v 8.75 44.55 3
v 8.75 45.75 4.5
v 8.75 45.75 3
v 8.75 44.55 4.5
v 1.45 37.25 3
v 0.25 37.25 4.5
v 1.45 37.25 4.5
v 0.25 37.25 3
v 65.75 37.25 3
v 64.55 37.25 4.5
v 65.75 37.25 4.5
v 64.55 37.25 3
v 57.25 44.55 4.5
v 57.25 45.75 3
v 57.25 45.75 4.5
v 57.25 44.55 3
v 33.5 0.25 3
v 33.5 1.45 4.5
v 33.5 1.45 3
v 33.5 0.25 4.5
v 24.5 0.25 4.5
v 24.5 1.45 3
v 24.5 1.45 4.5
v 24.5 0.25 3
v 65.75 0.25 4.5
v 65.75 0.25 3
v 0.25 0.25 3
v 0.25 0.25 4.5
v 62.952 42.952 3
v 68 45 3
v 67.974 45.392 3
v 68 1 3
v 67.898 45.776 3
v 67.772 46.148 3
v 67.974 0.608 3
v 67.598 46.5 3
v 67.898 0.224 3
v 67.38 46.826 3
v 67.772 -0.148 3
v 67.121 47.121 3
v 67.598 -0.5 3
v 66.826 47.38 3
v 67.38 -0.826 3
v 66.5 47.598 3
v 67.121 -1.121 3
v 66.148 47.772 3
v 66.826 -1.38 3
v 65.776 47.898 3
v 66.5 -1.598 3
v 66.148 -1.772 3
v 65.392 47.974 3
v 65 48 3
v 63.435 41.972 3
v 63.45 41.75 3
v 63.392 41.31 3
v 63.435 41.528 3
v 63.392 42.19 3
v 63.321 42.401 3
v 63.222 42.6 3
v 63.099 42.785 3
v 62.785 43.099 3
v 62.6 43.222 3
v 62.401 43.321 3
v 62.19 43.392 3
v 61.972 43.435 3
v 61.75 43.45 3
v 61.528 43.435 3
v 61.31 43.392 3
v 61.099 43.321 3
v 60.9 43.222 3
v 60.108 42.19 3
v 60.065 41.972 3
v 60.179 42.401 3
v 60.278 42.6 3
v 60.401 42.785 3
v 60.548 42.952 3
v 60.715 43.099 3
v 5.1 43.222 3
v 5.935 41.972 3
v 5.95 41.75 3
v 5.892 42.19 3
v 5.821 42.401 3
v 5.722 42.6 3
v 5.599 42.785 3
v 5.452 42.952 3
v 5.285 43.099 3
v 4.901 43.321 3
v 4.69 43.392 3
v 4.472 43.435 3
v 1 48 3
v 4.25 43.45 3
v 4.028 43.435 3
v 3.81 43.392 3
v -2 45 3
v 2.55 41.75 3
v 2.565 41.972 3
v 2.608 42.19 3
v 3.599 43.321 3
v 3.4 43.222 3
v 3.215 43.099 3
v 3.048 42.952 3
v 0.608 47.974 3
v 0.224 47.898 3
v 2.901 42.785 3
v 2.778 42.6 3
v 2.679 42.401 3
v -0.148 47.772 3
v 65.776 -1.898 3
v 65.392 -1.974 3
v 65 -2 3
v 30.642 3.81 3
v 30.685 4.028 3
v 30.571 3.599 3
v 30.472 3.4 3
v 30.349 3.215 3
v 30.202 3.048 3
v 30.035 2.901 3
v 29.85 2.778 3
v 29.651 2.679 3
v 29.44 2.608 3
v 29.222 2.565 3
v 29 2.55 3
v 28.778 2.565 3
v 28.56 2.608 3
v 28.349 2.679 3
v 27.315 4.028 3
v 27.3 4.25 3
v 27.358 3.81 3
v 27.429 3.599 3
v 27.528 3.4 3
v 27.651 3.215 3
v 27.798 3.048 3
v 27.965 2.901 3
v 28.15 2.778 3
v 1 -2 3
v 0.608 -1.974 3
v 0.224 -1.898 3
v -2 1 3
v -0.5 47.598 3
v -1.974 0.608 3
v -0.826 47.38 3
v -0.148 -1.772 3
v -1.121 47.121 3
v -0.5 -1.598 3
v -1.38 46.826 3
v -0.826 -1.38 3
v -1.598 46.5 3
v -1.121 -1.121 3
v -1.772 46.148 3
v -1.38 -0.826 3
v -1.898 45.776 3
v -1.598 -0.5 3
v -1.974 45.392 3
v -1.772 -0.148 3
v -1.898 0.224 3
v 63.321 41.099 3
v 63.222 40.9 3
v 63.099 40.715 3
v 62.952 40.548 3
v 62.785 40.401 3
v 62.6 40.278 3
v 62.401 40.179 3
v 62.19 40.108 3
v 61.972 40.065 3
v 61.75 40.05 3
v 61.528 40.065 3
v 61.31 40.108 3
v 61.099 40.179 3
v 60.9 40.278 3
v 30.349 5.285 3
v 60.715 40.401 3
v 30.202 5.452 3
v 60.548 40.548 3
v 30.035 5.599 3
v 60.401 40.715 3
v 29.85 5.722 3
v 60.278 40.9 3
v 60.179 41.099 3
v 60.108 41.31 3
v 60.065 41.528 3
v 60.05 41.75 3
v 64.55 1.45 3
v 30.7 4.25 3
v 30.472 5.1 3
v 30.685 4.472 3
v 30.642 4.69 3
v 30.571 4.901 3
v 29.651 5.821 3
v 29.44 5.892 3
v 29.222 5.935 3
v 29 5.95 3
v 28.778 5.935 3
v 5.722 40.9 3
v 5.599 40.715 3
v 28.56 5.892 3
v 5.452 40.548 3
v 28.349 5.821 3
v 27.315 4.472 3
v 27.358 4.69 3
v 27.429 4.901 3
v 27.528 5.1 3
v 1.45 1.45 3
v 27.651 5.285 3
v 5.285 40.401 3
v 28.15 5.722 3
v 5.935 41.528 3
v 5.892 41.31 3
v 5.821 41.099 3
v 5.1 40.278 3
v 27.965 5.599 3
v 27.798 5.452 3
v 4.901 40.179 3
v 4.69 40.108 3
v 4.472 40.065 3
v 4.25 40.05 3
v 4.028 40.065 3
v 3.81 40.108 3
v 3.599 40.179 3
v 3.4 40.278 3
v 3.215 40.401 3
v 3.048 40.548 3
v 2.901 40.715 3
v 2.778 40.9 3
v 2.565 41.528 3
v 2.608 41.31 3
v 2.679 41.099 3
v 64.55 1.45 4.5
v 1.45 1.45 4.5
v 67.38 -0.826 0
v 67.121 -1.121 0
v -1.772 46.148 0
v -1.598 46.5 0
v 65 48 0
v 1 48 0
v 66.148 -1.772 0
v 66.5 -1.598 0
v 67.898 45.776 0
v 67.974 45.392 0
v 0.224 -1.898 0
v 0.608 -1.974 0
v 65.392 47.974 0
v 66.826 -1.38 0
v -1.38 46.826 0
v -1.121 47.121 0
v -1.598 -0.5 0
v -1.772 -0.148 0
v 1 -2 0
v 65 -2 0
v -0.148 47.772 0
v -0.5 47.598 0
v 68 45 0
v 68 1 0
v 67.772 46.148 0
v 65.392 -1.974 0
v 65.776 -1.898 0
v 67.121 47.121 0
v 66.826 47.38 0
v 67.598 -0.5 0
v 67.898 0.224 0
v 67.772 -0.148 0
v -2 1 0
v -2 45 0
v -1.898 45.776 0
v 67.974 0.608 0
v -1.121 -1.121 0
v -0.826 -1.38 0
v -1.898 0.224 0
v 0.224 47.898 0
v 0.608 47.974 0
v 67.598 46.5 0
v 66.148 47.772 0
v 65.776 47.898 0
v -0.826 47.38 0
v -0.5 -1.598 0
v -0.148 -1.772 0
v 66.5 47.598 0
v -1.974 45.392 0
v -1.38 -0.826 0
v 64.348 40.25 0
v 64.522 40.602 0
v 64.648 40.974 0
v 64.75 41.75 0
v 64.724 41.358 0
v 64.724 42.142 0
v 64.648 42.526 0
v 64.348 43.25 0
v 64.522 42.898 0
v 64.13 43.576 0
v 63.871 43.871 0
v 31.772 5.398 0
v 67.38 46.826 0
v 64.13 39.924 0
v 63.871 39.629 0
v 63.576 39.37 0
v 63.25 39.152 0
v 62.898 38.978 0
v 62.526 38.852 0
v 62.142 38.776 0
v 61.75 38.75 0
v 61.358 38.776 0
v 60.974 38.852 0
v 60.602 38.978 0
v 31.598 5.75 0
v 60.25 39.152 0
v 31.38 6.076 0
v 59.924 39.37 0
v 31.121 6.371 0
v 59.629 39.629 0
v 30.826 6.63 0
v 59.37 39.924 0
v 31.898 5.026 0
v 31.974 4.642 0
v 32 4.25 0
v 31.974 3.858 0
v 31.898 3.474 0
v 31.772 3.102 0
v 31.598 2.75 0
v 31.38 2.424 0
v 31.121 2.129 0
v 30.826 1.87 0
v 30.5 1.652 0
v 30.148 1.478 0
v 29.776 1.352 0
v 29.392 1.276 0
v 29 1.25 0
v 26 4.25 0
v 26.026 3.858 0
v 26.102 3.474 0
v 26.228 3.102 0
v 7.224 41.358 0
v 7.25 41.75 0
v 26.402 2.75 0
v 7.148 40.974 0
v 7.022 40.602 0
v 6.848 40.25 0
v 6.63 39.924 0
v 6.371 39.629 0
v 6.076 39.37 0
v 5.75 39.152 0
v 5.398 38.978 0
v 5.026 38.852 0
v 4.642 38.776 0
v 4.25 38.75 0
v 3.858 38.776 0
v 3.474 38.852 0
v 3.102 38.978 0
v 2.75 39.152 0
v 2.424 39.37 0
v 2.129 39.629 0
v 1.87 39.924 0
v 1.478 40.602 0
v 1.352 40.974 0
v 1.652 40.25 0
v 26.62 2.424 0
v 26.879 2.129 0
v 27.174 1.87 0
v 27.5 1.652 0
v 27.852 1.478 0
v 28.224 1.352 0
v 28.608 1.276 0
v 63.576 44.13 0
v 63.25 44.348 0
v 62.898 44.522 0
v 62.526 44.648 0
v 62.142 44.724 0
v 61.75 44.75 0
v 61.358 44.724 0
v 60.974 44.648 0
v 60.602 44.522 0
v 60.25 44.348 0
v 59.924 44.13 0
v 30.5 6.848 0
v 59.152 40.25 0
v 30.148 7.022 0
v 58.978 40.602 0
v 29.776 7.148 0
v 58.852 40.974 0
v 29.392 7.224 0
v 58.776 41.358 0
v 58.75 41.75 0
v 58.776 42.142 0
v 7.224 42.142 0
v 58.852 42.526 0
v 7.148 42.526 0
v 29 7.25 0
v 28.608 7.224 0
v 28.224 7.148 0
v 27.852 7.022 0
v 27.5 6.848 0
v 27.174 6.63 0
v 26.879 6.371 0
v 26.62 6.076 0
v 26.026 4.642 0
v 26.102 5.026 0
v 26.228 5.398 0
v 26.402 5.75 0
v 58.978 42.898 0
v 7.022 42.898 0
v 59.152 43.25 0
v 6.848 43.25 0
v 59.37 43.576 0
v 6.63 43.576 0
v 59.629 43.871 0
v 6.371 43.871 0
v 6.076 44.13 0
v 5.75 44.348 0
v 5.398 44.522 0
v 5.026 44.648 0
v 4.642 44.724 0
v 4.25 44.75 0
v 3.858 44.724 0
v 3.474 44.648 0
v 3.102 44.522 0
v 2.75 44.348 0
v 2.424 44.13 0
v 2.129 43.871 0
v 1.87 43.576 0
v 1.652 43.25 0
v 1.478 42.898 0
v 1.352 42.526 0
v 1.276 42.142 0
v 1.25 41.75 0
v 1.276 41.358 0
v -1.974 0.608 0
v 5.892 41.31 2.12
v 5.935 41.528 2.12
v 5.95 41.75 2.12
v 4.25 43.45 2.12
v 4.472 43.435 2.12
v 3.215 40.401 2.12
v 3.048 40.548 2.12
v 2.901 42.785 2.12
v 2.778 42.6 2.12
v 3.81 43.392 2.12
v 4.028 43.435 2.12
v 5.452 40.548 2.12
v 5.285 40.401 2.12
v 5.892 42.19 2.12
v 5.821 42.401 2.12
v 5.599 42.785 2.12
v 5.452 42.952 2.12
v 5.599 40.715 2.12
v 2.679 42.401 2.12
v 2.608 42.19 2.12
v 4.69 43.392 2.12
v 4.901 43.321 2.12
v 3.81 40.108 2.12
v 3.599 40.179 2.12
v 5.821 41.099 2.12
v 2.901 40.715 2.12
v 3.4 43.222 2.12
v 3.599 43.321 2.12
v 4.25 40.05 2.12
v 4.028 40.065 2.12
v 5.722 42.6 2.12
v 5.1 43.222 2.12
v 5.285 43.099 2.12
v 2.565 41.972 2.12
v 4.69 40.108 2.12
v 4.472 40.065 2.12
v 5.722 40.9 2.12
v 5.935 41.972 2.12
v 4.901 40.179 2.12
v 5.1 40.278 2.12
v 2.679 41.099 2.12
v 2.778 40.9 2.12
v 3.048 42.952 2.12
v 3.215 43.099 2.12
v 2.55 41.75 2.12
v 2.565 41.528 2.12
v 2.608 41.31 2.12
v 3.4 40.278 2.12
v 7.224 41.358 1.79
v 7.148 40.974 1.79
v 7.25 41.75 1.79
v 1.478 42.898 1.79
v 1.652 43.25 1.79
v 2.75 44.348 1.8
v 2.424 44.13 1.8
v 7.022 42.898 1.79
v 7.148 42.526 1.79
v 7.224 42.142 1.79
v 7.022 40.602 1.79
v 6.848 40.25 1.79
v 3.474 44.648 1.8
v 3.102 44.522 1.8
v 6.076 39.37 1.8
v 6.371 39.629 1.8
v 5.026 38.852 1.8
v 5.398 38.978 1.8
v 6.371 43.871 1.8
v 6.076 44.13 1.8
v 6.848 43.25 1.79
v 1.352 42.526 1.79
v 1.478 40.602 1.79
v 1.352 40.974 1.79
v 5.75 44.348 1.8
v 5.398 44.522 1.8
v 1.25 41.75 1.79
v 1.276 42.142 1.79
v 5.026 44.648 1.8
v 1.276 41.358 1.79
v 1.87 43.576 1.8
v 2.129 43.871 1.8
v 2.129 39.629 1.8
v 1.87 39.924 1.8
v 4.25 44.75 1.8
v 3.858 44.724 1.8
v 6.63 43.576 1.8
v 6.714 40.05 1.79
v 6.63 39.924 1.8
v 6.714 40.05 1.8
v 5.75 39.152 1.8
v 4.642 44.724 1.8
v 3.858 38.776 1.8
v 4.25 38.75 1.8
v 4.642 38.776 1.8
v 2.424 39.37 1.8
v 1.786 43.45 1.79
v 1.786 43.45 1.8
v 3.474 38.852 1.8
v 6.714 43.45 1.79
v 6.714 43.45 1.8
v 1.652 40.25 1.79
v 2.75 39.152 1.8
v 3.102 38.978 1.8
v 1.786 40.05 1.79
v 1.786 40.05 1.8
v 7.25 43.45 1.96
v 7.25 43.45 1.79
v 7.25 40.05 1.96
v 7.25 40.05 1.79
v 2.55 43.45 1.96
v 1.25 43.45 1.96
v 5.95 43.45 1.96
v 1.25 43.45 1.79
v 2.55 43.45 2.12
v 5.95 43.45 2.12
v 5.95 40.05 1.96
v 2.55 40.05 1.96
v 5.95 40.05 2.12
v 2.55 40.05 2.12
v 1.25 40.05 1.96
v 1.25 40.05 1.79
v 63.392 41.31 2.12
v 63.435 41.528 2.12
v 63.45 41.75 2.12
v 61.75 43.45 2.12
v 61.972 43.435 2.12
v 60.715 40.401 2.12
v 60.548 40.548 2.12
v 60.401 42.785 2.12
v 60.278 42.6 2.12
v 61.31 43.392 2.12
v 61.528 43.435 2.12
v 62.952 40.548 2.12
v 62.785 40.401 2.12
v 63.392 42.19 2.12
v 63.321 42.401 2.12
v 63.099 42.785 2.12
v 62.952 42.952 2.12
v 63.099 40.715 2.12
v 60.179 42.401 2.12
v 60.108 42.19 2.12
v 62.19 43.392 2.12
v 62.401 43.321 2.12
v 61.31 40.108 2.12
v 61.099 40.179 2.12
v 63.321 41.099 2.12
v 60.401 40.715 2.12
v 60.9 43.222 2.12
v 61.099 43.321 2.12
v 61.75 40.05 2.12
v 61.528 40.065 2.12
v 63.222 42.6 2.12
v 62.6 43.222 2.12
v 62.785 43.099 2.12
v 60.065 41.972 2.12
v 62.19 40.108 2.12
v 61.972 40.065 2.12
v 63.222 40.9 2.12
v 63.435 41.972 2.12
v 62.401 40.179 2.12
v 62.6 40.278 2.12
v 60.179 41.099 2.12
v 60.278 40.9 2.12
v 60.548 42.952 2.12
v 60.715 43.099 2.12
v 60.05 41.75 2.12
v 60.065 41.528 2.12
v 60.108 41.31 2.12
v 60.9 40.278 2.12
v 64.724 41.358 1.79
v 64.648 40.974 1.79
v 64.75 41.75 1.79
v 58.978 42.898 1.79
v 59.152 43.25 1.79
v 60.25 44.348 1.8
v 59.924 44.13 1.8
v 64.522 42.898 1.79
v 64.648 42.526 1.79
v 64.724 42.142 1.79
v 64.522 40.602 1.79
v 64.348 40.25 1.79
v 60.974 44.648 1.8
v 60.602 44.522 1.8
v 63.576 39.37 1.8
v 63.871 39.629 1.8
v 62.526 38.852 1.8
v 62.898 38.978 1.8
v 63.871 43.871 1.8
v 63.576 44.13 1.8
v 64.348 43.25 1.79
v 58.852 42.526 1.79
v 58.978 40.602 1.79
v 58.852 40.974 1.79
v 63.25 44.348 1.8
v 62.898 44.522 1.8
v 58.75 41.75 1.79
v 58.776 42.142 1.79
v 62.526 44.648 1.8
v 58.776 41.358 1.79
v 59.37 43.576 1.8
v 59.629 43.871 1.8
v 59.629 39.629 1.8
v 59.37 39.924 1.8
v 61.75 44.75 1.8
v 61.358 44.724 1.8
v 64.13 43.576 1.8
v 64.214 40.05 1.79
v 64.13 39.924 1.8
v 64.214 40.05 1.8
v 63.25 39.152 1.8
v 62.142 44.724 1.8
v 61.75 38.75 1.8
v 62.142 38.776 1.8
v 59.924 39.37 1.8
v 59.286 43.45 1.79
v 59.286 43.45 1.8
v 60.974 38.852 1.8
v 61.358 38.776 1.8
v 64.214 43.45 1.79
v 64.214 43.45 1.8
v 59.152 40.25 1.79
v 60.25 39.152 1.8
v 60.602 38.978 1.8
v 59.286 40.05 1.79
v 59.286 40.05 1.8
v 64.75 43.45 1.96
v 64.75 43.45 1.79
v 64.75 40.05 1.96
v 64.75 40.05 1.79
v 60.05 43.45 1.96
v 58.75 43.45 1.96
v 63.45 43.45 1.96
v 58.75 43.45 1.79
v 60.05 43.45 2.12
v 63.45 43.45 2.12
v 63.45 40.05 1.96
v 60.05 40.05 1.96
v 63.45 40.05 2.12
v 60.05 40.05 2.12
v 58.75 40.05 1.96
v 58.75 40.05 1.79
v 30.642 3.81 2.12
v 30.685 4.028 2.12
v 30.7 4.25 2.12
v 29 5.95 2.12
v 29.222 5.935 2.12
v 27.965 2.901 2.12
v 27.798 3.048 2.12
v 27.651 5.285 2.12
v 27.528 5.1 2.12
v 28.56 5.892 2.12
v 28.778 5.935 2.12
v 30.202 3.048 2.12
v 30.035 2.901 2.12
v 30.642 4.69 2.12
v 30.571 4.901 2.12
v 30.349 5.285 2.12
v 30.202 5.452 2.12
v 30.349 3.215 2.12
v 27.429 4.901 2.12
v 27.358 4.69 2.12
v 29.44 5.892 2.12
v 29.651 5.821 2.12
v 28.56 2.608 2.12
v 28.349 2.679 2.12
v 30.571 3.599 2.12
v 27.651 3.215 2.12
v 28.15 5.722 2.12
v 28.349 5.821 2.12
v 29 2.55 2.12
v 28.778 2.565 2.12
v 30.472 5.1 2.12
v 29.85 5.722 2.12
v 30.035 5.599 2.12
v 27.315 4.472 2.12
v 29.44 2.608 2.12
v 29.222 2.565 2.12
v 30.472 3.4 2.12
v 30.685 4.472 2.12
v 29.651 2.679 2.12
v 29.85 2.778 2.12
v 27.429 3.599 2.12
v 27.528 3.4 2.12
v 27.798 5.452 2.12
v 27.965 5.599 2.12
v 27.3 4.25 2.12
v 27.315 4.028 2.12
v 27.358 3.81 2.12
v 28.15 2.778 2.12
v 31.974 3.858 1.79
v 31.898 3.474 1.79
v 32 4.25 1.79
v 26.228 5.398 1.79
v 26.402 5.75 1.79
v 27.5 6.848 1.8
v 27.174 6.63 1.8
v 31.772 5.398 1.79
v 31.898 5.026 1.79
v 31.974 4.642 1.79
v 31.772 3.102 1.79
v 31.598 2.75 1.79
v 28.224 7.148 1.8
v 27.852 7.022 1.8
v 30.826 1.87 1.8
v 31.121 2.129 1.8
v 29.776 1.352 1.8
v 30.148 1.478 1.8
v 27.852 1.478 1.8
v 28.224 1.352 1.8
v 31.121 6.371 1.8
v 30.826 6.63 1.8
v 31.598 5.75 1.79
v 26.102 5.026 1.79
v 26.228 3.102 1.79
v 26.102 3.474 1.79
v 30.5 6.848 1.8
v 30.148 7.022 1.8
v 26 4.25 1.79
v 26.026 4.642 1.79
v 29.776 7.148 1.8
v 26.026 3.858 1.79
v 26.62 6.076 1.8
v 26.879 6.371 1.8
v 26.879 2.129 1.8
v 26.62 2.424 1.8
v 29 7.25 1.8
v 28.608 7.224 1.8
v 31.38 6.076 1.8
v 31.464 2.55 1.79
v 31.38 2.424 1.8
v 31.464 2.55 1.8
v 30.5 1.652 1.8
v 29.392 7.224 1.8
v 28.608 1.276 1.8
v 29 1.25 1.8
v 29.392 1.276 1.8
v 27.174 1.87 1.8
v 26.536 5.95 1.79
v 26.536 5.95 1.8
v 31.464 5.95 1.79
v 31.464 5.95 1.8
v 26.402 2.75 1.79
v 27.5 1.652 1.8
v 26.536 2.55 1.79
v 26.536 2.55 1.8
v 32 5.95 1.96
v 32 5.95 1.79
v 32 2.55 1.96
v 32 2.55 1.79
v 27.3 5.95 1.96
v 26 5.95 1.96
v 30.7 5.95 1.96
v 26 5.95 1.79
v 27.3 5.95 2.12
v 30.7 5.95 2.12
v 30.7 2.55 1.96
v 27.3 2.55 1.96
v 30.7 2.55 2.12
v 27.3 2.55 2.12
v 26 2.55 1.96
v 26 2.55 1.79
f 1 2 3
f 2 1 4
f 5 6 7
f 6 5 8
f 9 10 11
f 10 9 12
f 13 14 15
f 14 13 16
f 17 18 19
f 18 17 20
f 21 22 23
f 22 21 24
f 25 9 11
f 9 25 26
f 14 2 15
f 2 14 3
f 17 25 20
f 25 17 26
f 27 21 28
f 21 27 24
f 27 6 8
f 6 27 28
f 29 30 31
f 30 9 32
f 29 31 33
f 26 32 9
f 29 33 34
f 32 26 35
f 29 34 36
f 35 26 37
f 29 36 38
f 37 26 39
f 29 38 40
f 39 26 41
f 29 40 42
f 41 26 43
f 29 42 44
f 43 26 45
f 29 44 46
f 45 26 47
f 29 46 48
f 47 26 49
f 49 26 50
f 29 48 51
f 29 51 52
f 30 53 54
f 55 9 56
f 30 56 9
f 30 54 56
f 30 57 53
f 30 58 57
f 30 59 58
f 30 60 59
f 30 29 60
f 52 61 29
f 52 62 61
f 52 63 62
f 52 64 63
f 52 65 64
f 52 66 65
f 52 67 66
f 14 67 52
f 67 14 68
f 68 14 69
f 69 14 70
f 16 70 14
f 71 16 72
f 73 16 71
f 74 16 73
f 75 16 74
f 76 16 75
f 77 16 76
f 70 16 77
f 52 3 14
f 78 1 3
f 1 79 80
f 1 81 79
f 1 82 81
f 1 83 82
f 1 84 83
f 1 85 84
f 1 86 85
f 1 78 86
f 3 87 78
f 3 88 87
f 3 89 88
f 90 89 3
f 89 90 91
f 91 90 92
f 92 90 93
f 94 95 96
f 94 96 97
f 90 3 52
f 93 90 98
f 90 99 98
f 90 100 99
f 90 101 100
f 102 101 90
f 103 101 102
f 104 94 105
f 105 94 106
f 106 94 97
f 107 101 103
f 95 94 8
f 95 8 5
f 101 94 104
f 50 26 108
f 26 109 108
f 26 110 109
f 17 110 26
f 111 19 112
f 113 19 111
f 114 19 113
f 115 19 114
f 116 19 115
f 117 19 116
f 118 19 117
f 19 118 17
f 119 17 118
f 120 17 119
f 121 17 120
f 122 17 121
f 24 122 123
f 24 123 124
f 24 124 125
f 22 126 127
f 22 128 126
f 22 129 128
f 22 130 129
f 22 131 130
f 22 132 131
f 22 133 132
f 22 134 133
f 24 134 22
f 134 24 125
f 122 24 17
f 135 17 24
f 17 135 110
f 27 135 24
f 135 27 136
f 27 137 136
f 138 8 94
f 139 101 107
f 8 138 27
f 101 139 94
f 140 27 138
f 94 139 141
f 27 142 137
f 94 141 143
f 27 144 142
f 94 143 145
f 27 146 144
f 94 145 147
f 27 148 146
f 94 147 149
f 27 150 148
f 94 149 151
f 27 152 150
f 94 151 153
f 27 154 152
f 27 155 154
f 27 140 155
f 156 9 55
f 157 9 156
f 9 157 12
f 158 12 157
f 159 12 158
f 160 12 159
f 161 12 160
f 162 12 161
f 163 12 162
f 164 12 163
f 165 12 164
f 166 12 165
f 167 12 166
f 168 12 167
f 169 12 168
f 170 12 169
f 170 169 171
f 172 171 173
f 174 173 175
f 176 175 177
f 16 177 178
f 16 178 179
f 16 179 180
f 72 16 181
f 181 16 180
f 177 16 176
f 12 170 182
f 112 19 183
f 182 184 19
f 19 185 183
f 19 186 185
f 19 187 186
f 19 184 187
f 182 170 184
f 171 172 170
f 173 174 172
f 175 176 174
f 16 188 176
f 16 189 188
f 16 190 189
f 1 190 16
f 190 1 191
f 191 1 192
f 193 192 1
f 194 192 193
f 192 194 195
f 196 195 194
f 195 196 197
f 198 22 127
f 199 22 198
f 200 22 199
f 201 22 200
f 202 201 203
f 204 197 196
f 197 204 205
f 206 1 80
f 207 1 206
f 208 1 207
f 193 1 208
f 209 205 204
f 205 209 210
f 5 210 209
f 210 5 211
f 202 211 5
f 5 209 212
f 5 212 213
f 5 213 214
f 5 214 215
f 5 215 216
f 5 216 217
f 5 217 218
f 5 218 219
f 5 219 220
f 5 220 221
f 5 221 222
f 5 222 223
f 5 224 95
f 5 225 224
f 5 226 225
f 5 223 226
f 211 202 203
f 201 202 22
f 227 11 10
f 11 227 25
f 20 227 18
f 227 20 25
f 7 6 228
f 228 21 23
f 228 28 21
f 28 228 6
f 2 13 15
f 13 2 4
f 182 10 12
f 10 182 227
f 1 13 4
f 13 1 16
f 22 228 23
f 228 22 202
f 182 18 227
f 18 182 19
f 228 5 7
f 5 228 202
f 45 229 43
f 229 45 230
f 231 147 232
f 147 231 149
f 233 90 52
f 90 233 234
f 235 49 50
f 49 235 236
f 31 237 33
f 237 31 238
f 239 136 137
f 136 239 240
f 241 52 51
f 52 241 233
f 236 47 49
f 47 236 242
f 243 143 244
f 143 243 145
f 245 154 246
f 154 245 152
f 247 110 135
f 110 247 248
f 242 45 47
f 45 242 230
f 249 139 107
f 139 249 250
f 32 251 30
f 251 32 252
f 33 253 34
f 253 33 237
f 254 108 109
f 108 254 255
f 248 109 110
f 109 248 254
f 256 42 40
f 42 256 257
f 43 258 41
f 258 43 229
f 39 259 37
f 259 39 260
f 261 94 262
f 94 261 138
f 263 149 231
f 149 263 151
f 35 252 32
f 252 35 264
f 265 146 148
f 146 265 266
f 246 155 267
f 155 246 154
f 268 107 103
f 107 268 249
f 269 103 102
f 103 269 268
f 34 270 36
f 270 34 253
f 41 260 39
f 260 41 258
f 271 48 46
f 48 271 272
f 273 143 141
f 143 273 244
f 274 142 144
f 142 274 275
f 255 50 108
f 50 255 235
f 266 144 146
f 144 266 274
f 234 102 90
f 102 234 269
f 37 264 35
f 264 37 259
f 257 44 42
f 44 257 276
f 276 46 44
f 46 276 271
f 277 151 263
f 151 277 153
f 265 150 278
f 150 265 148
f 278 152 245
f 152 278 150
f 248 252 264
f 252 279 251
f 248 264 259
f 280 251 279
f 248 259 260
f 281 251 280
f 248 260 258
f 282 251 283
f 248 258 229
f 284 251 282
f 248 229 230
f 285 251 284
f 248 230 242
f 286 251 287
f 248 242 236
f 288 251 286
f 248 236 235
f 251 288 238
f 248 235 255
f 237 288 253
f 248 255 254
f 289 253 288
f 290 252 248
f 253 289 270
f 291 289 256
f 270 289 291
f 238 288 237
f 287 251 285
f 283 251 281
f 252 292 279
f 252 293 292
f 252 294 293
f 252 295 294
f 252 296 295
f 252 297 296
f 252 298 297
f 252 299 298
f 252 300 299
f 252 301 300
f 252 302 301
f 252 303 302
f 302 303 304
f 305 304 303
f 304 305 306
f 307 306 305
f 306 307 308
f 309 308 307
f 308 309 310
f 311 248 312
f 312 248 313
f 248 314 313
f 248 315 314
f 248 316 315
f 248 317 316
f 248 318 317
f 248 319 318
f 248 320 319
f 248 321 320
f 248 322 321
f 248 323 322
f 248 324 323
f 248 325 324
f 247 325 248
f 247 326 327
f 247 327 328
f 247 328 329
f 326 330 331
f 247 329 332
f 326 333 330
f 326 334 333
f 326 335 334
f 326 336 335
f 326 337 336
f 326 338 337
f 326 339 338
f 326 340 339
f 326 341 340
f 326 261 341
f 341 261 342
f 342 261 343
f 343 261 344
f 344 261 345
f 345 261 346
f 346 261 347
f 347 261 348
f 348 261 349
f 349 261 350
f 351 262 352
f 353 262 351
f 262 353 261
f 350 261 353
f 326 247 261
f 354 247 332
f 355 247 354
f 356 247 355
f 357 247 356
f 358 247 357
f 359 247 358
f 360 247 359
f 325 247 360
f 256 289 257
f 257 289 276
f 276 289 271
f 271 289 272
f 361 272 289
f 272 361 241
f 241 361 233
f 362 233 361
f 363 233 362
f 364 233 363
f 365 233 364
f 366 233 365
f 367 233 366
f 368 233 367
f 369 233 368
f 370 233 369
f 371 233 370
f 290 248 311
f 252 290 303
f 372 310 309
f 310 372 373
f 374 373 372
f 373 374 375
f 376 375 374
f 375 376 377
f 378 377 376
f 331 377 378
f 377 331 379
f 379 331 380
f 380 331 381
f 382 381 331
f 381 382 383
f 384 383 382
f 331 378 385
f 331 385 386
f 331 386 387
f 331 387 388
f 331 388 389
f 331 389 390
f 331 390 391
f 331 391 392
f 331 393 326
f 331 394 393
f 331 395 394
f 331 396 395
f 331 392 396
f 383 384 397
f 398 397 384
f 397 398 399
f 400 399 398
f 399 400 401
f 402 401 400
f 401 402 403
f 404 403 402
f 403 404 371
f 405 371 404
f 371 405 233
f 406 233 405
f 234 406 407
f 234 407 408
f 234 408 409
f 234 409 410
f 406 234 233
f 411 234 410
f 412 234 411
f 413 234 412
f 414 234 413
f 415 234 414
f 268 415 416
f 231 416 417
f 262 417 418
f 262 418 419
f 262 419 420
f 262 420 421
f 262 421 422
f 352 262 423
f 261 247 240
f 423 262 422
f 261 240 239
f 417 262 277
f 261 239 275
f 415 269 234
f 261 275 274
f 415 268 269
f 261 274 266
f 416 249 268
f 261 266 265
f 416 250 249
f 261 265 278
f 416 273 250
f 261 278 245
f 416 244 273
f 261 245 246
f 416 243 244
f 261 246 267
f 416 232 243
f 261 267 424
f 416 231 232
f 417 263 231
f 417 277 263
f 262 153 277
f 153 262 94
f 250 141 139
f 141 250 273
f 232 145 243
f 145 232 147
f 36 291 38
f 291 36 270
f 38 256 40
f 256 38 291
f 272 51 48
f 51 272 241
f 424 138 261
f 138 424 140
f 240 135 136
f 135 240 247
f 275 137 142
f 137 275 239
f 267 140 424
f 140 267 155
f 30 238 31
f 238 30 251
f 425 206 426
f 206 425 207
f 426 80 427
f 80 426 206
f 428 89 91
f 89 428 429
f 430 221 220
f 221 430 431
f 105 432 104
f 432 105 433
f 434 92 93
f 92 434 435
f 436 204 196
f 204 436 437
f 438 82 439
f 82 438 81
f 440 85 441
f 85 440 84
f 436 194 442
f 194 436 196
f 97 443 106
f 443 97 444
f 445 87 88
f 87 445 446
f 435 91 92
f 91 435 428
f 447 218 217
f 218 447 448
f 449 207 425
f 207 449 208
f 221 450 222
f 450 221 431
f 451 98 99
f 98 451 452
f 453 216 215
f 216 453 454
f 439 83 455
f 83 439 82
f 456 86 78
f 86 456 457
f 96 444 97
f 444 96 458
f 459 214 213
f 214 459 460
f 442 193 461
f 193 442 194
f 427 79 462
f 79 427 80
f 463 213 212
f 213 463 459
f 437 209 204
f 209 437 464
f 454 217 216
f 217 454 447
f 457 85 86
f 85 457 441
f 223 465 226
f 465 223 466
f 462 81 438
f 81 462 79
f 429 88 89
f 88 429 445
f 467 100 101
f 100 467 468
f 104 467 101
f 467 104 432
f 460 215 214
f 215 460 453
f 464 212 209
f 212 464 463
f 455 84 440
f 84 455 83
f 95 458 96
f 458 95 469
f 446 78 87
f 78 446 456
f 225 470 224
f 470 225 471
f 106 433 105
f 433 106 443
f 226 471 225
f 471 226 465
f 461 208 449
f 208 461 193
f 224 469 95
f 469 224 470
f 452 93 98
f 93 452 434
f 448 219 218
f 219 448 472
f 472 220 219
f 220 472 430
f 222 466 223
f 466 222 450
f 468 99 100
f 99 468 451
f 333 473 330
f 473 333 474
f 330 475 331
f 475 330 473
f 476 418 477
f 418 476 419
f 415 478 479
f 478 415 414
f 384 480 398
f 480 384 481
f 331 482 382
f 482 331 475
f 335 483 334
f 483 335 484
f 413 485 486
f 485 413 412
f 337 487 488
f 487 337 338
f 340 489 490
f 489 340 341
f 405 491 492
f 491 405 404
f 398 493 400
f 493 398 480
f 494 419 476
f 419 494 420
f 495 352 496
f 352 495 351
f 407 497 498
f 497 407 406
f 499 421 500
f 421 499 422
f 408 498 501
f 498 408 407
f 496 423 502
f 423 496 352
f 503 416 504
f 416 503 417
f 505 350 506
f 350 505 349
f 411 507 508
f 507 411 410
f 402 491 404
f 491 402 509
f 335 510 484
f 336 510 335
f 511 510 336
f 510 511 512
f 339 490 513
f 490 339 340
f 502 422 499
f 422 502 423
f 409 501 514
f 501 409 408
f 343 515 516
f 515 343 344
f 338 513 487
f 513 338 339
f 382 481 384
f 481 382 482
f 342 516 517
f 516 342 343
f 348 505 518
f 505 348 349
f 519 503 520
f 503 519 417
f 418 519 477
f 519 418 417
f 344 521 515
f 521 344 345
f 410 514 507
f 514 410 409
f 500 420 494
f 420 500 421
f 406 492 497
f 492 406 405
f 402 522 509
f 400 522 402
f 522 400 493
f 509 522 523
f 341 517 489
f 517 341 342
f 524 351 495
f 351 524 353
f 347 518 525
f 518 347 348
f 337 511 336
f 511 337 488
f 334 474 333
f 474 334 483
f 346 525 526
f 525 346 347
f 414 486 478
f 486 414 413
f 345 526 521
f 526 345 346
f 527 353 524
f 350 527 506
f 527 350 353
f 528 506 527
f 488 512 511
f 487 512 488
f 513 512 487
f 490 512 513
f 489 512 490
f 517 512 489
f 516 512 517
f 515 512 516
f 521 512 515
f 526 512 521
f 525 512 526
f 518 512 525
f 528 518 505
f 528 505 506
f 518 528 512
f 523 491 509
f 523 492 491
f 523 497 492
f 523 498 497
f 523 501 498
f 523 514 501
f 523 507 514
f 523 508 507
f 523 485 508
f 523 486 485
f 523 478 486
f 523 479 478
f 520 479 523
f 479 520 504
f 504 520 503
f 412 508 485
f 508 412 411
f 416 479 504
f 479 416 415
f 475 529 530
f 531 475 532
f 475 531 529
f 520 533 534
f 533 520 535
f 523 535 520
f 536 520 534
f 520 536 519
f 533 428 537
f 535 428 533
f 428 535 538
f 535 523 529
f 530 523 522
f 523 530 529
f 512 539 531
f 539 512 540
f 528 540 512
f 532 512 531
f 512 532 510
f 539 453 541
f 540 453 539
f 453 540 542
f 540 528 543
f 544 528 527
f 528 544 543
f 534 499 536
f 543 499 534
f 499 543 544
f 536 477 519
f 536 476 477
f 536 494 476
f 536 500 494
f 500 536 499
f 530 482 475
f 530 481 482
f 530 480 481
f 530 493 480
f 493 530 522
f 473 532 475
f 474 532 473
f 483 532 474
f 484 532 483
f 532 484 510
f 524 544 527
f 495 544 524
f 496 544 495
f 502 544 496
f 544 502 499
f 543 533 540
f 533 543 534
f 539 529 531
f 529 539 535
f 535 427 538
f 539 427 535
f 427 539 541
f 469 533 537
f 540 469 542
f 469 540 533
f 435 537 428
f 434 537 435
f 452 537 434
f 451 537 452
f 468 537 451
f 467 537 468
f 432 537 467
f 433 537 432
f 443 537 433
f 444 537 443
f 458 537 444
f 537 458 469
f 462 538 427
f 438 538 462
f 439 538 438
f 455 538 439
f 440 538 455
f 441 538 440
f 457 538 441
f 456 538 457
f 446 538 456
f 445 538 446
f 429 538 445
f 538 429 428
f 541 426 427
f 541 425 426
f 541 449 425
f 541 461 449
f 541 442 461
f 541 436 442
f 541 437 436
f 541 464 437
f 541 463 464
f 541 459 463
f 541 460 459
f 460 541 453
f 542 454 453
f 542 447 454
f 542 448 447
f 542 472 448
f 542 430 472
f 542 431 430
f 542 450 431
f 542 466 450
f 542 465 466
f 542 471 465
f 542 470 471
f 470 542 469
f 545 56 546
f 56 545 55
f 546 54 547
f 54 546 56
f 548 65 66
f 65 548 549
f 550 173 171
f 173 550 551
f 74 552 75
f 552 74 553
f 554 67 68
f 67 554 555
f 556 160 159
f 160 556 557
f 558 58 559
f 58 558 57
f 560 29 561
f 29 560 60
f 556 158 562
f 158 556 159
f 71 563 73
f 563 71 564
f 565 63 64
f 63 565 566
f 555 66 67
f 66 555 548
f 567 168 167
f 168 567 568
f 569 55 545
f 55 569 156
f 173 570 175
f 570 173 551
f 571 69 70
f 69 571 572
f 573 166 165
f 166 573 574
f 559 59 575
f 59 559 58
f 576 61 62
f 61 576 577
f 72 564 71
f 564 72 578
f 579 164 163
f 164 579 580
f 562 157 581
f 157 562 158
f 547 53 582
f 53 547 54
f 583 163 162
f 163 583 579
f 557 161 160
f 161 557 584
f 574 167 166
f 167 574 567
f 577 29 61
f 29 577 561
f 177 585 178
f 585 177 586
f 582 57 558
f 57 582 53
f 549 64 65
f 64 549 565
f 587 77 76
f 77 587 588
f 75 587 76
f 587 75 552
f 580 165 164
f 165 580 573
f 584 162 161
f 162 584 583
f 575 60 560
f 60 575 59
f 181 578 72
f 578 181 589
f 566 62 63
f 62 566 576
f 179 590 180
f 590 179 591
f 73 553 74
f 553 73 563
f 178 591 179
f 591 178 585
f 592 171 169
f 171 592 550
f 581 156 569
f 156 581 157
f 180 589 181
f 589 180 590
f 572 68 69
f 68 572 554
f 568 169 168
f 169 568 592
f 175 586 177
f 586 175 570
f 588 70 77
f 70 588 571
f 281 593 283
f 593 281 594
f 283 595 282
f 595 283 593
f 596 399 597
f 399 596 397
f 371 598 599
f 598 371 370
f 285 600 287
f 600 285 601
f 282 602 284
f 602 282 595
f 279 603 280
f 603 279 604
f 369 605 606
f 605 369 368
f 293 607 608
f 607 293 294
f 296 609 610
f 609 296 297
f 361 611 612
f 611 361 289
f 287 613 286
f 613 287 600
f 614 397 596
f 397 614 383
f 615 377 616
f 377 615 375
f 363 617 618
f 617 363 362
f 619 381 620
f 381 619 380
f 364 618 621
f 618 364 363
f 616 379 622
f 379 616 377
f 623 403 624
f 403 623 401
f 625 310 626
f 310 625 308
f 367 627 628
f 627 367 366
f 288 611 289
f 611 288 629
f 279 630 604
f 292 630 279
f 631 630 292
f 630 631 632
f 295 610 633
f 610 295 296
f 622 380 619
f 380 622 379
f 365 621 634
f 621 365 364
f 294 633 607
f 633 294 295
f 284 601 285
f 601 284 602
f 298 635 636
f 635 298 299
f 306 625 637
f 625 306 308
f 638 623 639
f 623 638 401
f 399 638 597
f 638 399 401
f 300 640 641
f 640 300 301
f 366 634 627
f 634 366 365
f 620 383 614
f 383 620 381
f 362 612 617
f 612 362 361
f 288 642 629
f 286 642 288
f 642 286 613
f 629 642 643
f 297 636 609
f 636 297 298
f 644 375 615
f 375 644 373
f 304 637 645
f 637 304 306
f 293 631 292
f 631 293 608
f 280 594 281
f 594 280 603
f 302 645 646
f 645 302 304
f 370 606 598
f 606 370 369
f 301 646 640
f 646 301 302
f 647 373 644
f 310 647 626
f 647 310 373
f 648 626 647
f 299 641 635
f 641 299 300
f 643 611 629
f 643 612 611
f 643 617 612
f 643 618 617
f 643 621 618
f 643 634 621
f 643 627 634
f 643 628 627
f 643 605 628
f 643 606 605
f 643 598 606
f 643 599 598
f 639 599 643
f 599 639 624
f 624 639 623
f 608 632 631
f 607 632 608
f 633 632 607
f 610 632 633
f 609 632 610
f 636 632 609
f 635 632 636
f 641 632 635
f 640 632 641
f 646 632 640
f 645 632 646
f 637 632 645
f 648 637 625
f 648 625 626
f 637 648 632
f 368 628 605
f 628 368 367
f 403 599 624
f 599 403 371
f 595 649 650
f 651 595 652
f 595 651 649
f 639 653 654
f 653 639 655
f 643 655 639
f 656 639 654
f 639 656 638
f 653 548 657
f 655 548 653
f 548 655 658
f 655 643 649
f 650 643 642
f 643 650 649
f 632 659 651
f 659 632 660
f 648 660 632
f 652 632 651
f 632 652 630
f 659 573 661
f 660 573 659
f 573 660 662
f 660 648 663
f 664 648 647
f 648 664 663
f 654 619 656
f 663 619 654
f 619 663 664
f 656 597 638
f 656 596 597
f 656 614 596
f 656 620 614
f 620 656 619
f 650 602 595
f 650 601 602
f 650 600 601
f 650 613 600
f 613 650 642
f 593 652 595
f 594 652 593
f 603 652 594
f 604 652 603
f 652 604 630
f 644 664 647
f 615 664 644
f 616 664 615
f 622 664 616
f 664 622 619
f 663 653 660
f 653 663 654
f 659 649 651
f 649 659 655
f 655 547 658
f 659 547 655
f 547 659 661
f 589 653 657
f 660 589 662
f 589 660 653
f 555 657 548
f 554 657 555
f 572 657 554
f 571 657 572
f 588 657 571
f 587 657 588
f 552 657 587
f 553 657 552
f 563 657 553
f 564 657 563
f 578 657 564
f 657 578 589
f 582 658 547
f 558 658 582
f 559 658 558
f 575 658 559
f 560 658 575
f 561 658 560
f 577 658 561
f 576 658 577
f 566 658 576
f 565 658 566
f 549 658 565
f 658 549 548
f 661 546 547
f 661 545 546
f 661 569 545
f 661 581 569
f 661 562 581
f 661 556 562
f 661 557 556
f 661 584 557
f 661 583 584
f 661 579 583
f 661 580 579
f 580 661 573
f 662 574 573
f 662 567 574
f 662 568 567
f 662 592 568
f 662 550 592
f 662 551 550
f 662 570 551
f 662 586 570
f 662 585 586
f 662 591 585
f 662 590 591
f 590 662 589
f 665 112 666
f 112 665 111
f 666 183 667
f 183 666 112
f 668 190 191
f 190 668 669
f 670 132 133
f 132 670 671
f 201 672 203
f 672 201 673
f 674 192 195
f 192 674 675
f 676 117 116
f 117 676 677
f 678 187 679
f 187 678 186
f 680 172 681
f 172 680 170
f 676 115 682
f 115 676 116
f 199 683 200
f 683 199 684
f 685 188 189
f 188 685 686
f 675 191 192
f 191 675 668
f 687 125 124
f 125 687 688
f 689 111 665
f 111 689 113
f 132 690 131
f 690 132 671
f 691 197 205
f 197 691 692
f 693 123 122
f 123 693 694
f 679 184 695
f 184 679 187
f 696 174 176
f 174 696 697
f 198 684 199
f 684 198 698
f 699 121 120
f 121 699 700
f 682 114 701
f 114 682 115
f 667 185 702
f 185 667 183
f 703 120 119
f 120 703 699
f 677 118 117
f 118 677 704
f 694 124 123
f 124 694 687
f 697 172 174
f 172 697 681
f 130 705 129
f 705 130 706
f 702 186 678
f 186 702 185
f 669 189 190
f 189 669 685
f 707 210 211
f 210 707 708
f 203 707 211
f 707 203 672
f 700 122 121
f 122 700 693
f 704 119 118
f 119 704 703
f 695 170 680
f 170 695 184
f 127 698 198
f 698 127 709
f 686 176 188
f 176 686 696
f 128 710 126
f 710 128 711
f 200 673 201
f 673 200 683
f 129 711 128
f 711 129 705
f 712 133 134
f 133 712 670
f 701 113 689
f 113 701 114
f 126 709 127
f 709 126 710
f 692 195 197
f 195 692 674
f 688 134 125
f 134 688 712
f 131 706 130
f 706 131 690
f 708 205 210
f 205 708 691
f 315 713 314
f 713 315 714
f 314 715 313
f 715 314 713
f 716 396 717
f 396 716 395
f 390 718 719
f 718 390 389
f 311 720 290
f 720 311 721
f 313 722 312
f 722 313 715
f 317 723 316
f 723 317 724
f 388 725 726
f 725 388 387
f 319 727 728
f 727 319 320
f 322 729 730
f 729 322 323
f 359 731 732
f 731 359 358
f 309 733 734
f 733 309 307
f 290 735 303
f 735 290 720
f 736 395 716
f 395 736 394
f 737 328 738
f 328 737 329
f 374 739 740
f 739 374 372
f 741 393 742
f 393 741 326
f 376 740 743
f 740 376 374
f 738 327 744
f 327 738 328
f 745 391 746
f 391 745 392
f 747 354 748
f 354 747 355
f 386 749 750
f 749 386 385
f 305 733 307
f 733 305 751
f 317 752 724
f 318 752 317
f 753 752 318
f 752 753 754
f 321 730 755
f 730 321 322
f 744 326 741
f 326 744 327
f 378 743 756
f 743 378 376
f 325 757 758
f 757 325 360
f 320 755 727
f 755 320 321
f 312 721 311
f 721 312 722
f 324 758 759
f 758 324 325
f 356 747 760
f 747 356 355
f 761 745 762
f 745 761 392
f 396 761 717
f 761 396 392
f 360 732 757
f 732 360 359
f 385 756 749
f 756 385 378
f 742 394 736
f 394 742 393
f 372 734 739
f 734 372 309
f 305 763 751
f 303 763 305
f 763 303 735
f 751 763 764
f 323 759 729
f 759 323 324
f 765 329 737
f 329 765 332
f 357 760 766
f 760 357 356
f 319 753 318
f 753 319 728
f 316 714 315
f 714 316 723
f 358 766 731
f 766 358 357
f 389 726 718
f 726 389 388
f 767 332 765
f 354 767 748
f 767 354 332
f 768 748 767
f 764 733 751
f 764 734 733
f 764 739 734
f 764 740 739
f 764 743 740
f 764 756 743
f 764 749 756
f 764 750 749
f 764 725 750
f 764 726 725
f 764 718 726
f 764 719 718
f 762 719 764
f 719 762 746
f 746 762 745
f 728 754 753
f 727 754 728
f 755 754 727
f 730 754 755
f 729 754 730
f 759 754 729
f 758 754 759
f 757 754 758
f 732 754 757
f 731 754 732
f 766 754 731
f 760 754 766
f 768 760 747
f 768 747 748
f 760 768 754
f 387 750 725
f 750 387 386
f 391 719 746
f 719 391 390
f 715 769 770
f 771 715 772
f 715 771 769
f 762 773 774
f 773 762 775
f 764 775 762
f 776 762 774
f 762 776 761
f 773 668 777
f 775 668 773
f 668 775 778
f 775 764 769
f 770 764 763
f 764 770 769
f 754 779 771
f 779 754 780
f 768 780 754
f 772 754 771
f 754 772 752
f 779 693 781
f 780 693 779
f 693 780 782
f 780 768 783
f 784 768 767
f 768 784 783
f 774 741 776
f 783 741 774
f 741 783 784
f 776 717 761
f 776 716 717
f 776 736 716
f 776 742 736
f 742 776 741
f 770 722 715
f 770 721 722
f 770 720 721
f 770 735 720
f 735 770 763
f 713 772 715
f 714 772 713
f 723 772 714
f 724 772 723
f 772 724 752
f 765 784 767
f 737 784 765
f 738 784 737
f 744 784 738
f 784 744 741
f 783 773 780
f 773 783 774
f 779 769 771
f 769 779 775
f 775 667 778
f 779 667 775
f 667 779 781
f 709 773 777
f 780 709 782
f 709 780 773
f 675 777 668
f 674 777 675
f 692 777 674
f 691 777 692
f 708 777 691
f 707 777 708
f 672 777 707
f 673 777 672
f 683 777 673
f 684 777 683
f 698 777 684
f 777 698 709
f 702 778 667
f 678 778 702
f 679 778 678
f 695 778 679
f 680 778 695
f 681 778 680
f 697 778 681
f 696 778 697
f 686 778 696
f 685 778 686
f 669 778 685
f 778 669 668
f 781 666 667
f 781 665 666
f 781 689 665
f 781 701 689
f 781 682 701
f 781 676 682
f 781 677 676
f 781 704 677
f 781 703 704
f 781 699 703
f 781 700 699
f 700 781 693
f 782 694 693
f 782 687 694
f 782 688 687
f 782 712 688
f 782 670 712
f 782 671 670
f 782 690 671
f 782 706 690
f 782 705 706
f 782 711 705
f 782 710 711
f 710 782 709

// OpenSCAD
// AirWatch Case v4.3 - 2-Part All-PA6-CF Print (0.16 mm, Zero Supports)
// - XIAO ESP32-S3: flat on floor (VHB on shield), 9.25 mm walls, 22 x 19.25 mm pocket, full U.FL cutout
// - ATGM336H GPS:  flat on floor (VHB on RF shield), 9.25 mm walls, 14 x 18.75 mm pocket, full U.FL cutout
// - GPS Antenna:   6.15 x 20.5 mm exposed roof pocket (6.1 mm tall antenna, nubs grip
//                  at 6.0 mm), left-side ramp notch + bottom U.FL/coax pass-through
// - 0.91" SSD1306 OLED: 3-sided C-frame (12.2 mm inner height, header stop on -X, open +X ribbon side)
// - 12 mm buzzer (7 mm deep ring, 12.5 mm ID) & 9.5 mm WS2812B LED (3.4 mm deep, 10.4 mm ID slotted ring)
// - 6x6 2-pin tact switch near rear top edge (glued, easy rear soldering) + SMA bulkhead
//
// Print orientations (pre-rotated):
//   part = "shell" -> front face down, zero supports (PA6-CF)
//   part = "lid"   -> outside down, zero supports (PA6-CF)
// Preview:
//   part = "assembly"

part = "lid";

// ---------------- general ----------------
wall      = 2.0;    // side / top / bottom walls
front     = 2.0;    // driver-facing front wall
lid_t     = 3.0;    // back lid thickness
fit       = 0.25;   // lid lip & buzzer clearance
corner_r  = 3.0;    // outer edge rounding
layer_h   = 0.16;   // slicer layer height (clean counterbore bridges)
usb_right = true;   // true = XIAO on right / GPS on left (aligns both U.FL cutouts)

// Inner cavity (outer = 70 x 50 x 41 mm)
W = 66;             // width  (left-right)
H = 46;             // height (bottom-top)
D = 36;             // depth  (front to lid)

// ---------------- floor pockets (XIAO & GPS, flat on z = 0 with VHB) ----------------
pocket_h  = 9.25;   // tall walls cup past PCB & header bases
pocket_t  = 1.8;    // pocket wall thickness

// XIAO ESP32-S3 (21 mm PCB / 23 mm w/ USB overhang, 18 mm wide, 5.5 mm PCB height, 21 mm w/ DuPonts)
xiao_l_clr  = 22.0; // inner X length (2 mm USB overhang seats into 2 mm side wall slot)
xiao_w_clr  = 19.25;// inner Y width (+1.25 mm over 18 mm board for splayed jumper wires)
xiao_cut_y  = 8.5;  // full floor-to-top inner-wall cutout at front U.FL corner
usb_open_w  = 14.5; // generous USB-C cable opening width (stays clear of rear pocket wall)
usb_open_z1 = 8.5;  // top of USB-C opening (bottom goes flush to -wall as U-slot)

// ATGM336H GPS (13 x 16 mm board: flat RF shield down on VHB, 5-pin DuPonts up at rear,
// U.FL connector on top at front-inner corner exiting through full wall cutout)
gps_w_clr = 14.0;   // inner X width
gps_l_clr = 18.75;  // inner Y length (extra room along U.FL-to-header axis)
gps_cut_y = 7.5;    // full floor-to-top inner-wall cutout at front-inner U.FL corner

// ---------------- built-in exposed GPS ceramic antenna pocket ----------------
// 20 x 6 x 6.1 mm ceramic antenna; coax exits front-left (+X) notch into bottom pass-through
gant_in_w    = 6.15; // pocket width (bump to 6.3 if you want more pronounced nubs)
gant_in_l    = 20.5; // pocket length
gant_h       = 6.1;  // antenna height/depth
gant_proud   = 0.5;  // ceramic height proud above outer roof (set 0 for totally flush)
gant_grip    = 6.0;  // spacing between opposing friction nubs
gant_shelf_t = 1.4;  // bottom shelf floor thickness
gant_wall    = 1.4;  // trough side/rear wall thickness
gant_pass_w  = 4.5;  // bottom pass-through width (flush to +X wall, clears U.FL)
gant_pass_l  = 6.5;  // bottom pass-through length
gant_notch_w = 2.8;  // coax notch width through left (+X) side of front 45-deg ramp

gant_drop = gant_h - gant_proud - wall;           // 3.6 mm below inner ceiling (5.6 mm deep)
gant_nub  = max(0, (gant_in_w - gant_grip) / 2);  // 0.075 mm per side -> 6.0 mm grip

// ---------------- front & top cutouts ----------------
// 0.91" SSD1306 OLED (38 x 12 mm PCB, 22.4 x 5.6 mm active area)
// Butt header edge (-X) against stop wall; +X ribbon end is completely open
oled_w       = 38.0;
oled_h_clr   = 12.2; // tight 12.2 mm inner height for 12 mm PCB
oled_frame_t = 1.6;
oled_frame_d = 3.5;  // cradles VHB + OLED module
oled_win_w   = 25.0;
oled_win_h   = 7.6;
oled_cx      = W / 2 + 0.4; // aligns active pixels dead-center in W/2 window
oled_cz      = H - 9.2;     // 36.8 mm up -> 29.1 mm clear below frame (8.1 mm over XIAO DuPonts)

// Active buzzer (12 x 9.5 mm) — 12.5 mm ID, deeper 7 mm cradle
buz_d      = 12.0;
buz_clr_d  = buz_d + 2 * fit; // 12.5 mm
buz_ring_h = 7.0;

// WS2812B LED (9.5 mm round board) — 10.4 mm ID, deeper 3.4 mm wire-slotted cradle
led_d      = 9.5;
led_clr_d  = 10.4;
led_ring_h = 3.4;
led_hole   = 4.8;

// Top: 6x6 2-pin tact switch (near rear opening) & SMA bulkhead
btn_body   = 6.2;
btn_pitch  = 5.0;
btn_leg_d  = 1.4;
btn_seat_d = 0.6;
sma_hole   = 6.7;

// Lid: 3x M3 screws into heat-set inserts (Ruthex RX-M3x5.7)
insert_d     = 4.0;
insert_hole  = 7.5;
boss         = 8.5;
boss_len     = 9.0;
screw_clear  = 3.4;
screw_head   = 6.0;
screw_head_h = 1.8;
lip_h        = 1.5;
lip_w        = 1.2;

$fn = 48;

// ---------------- layout (inner coords: origin = front-bottom-left) ----------------
function mx(x) = usb_right ? x : W - x;

xiao_x0    = usb_right ? W - xiao_l_clr : 0;
xiao_wallx = usb_right ? xiao_x0 - pocket_t : xiao_l_clr;
xiao_cy    = xiao_w_clr / 2;

gps_x0     = usb_right ? 0 : W - gps_w_clr;
gps_wallx  = usb_right ? gps_w_clr : W - gps_w_clr - pocket_t;

buz_c   = [mx(22.5), 17.0];             // clears 9.25 mm pocket walls & GPS DuPonts
led_c   = [mx(37.5), 17.0];             // aligned with buzzer, clear of buzzer ring & XIAO DuPonts
gant_x0 = (W - gant_in_w) / 2;          // centered on top
gant_y0 = 8.8;                          // 45-deg front ramp starts at y=3.8 (clears OLED frame)
btn_c   = [mx(16.0), D - 6.5];          // 6.5 mm from open rear edge for easy soldering
sma_c   = [mx(W - 15.0), D - 8.5];      // clears OLED, GPS pocket & top-right boss
screws  = [
  [boss / 2, H - boss / 2],
  [W - boss / 2, H - boss / 2],
  [mx(29.0), boss / 2]                  // centered in 26.4 mm open gap between GPS & XIAO
];

// ---------------- helpers ----------------
module rounded_box(x0, x1, y0, y1, z0, z1, r) {
  hull() for (x = [x0 + r, x1 - r], z = [z0 + r, z1 - r])
    translate([x, y0, z]) rotate([-90, 0, 0]) cylinder(r = r, h = y1 - y0);
}

// Round hole along z with 45-deg teardrop peak at +y (prints clean front-down)
module tear_z(d, h) {
  linear_extrude(h) hull() {
    circle(d = d);
    translate([0, d / 2 * 1.414]) circle(d = 0.01);
  }
}

// Shallow outside-top pocket with 45-deg sloped +y edge (zero overhang)
module sloped_top_pocket(x0, y0, w, l, depth) {
  hull() {
    translate([x0, y0, H + wall - depth]) cube([w, l, 0.01]);
    translate([x0, y0, H + wall]) cube([w, l + depth, 1]);
  }
}

// M3 heat-set boss with 45-deg self-supporting front ramp
module insert_boss(c) {
  x0 = max(0, min(W - boss, c[0] - boss / 2));
  z0 = max(0, min(H - boss, c[1] - boss / 2));
  difference() {
    hull() {
      translate([x0, D - boss_len, z0]) cube([boss, boss_len, boss]);
      translate([x0, D - boss_len - boss, c[1] > H / 2 ? H - 0.01 : 0])
        cube([boss, 0.01, 0.01]);
    }
    translate([c[0], D - insert_hole, c[1]])
      rotate([-90, 0, 0]) cylinder(d = insert_d, h = insert_hole + 1);
  }
}

// Inner side wall of a floor pocket: completely open from y = 0..cut_y for U.FL coax,
// then ramps up at 45 deg (zero overhang when printed front-down) to join the rear wall.
module ramped_side_wall(x, cut_y, y_end) {
  hull() {
    translate([x, cut_y, 0]) cube([pocket_t, 0.01, 0.01]);
    translate([x, cut_y + pocket_h, 0]) cube([pocket_t, 0.01, pocket_h]);
    translate([x, y_end - 0.01, 0]) cube([pocket_t, 0.01, pocket_h]);
  }
}

// Oversized USB-C U-slot through side wall with 45-deg chamfered +y ceiling
module usb_slot() {
  y0 = xiao_cy - usb_open_w / 2;
  y1 = xiao_cy + usb_open_w / 2;
  z0 = -wall;
  z1 = usb_open_z1;
  c  = 2.3; // keeps chamfered peak clear of XIAO rear pocket wall
  translate([usb_right ? W - 0.5 : -wall - 0.5, 0, 0])
    rotate([90, 0, 90])
      linear_extrude(wall + 1)
        polygon([
          [y0, z0 - 1], [y1, z0 - 1], [y1, z0],
          [y1 + c, z0 + c], [y1 + c, z1 - c], [y1, z1], [y0, z1]
        ]);
}

// Self-supporting diamond friction nub inside the GPS roof pocket (zero overhang)
module gps_nub(x_wall, dir, y_mid) {
  if (gant_nub > 0) {
    z0 = H - gant_drop;
    zh = gant_drop + wall - 0.8; // 0.8 mm open lead-in at outer roof
    bx = dir > 0 ? x_wall - 0.3 : x_wall;
    tx = dir > 0 ? x_wall + gant_nub - 0.01 : x_wall - gant_nub;
    hull() {
      translate([bx, y_mid - 1.0, z0]) cube([0.3, 2.0, zh]);
      translate([tx, y_mid - 0.3, z0]) cube([0.01, 0.6, zh]);
    }
  }
}

// ---------------- shell ----------------
module shell() {
  total_drop = gant_drop + gant_shelf_t; // 5.0 mm below inner ceiling
  pass_x0    = gant_x0 + gant_in_w - gant_pass_w;
  notch_x0   = gant_x0 + gant_in_w - gant_notch_w;

  union() {
    difference() {
      union() {
        difference() {
          rounded_box(-wall, W + wall, -front, D, -wall, H + wall, corner_r);
          cube([W, D + 1, H]);
        }

        // --- Full-length GPS antenna roof trough (45-deg front ramp = zero supports) ---
        hull() {
          translate([gant_x0 - gant_wall, gant_y0 - total_drop, H - 0.01])
            cube([gant_in_w + 2 * gant_wall, 0.01, 0.02]);
          translate([gant_x0 - gant_wall, gant_y0, H - total_drop])
            cube([gant_in_w + 2 * gant_wall, gant_in_l + gant_wall, total_drop + 0.01]);
        }

        // --- 0.91" OLED 3-sided C-frame (12.2 mm inner height, open +X ribbon side) ---
        oled_x_stop = oled_cx - oled_w / 2 - 0.3;
        oled_rail_l = oled_w + 0.3 + oled_frame_t;
        translate([oled_x_stop - oled_frame_t, 0, oled_cz - oled_h_clr / 2 - oled_frame_t])
          cube([oled_frame_t, oled_frame_d, oled_h_clr + 2 * oled_frame_t]);
        for (z = [oled_cz - oled_h_clr / 2 - oled_frame_t, oled_cz + oled_h_clr / 2])
          translate([oled_x_stop - oled_frame_t, 0, z])
            cube([oled_rail_l, oled_frame_d, oled_frame_t]);

        // --- XIAO ESP32-S3 walled floor pocket (9.25 mm walls, full U.FL cutout) ---
        ramped_side_wall(xiao_wallx, xiao_cut_y, xiao_w_clr + pocket_t);
        translate([usb_right ? xiao_wallx : 0, xiao_w_clr, 0])
          cube([xiao_l_clr + pocket_t, pocket_t, pocket_h]);

        // --- ATGM336H GPS walled floor pocket (14 x 18.75 mm, 9.25 mm walls, full U.FL cutout) ---
        ramped_side_wall(gps_wallx, gps_cut_y, gps_l_clr + pocket_t);
        translate([usb_right ? 0 : gps_wallx, gps_l_clr, 0])
          cube([gps_w_clr + pocket_t, pocket_t, pocket_h]);

        // Deeper glue-in ring for 12 mm buzzer (12.5 mm ID, 7 mm deep)
        translate([buz_c[0], 0, buz_c[1]]) rotate([-90, 0, 0]) difference() {
          cylinder(d = buz_clr_d + 2.4, h = buz_ring_h);
          translate([0, 0, -1]) cylinder(d = buz_clr_d, h = buz_ring_h + 2);
        }

        // Deeper glue-in ring for 9.5 mm WS2812B LED (10.4 mm ID, 3.4 mm deep, wire-slotted)
        translate([led_c[0], 0, led_c[1]]) rotate([-90, 0, 0]) difference() {
          cylinder(d = led_clr_d + 2.2, h = led_ring_h);
          translate([0, 0, -1]) cylinder(d = led_clr_d, h = led_ring_h + 2);
          translate([-2.5, -led_clr_d, 0.8]) cube([5.0, 2 * led_clr_d, led_ring_h + 1]);
        }

        // 3x lid screw bosses
        for (c = screws) insert_boss(c);
      }

      // Exposed GPS antenna pocket (6.15 x 20.5 mm, 5.6 mm deep from outer roof)
      translate([gant_x0, gant_y0, H - gant_drop])
        cube([gant_in_w, gant_in_l, gant_drop + wall + 1]);
      // Bottom U.FL + coax pass-through hole flush to +X inner wall (leaves 1.65 mm right ledge)
      translate([pass_x0, gant_y0, H - total_drop - 1])
        cube([gant_pass_w, gant_pass_l, gant_shelf_t + 2]);
      // Coax notch through left (+X) side of front ramp (leaves 45-deg ramps on both sides)
      translate([notch_x0, gant_y0 - total_drop - 0.1, H - total_drop - 1])
        cube([gant_notch_w, total_drop + 0.2, total_drop + 1]);

      // OLED window (45-deg exterior chamfer, centered on front face)
      translate([W / 2, -front - 0.01, oled_cz])
        hull() {
          translate([0, front, 0]) cube([oled_win_w, 0.02, oled_win_h], center = true);
          cube([oled_win_w + 1.4, 0.02, oled_win_h + 1.4], center = true);
        }

      // Buzzer acoustic holes (7x)
      for (a = [0 : 60 : 300])
        translate([buz_c[0] + 3.2 * cos(a), -front - 1, buz_c[1] + 3.2 * sin(a)])
          rotate([-90, 0, 0]) cylinder(d = 1.6, h = front + 2);
      translate([buz_c[0], -front - 1, buz_c[1]])
        rotate([-90, 0, 0]) cylinder(d = 1.9, h = front + 2);

      // LED hole
      translate([led_c[0], -front - 1, led_c[1]])
        rotate([-90, 0, 0]) cylinder(d = led_hole, h = front + 2);

      // Oversized USB-C U-slot
      usb_slot();

      // SMA antenna hole (teardrop)
      translate([sma_c[0], sma_c[1], H - 1]) tear_z(sma_hole, wall + 2);

      // 6x6 tact button leg holes + shallow glue seat (near rear edge)
      for (s = [-1, 1])
        translate([btn_c[0] + s * btn_pitch / 2, btn_c[1], H - 1])
          tear_z(btn_leg_d, wall + 2);
      sloped_top_pocket(btn_c[0] - btn_body / 2 - fit, btn_c[1] - btn_body / 2 - fit,
                        btn_body + 2 * fit, btn_body + 2 * fit, btn_seat_d);
    }

    // Light press-fit nubs gripping at 6.0 mm (added after pocket cutout)
    for (ym = [gant_y0 + 5.5, gant_y0 + gant_in_l - 5.5]) {
      gps_nub(gant_x0, +1, ym);
      gps_nub(gant_x0 + gant_in_w, -1, ym);
    }
  }
}

// ---------------- lid ----------------
module lid() {
  difference() {
    union() {
      rounded_box(-wall, W + wall, D, D + lid_t, -wall, H + wall, corner_r);
      // Alignment lip, cleared around the 3 screw bosses
      difference() {
        translate([fit, D - lip_h, fit]) cube([W - 2 * fit, lip_h, H - 2 * fit]);
        translate([fit + lip_w, D - lip_h - 1, fit + lip_w])
          cube([W - 2 * fit - 2 * lip_w, lip_h + 2, H - 2 * fit - 2 * lip_w]);
        for (c = screws)
          translate([max(0, min(W - boss, c[0] - boss / 2)) - fit,
                     D - lip_h - 1,
                     max(0, min(H - boss, c[1] - boss / 2)) - fit])
            cube([boss + 2 * fit, lip_h + 2, boss + 2 * fit]);
      }
    }

    // M3 counterbores with 2-layer clean-bridge trick (0.16 mm layers)
    for (c = screws) {
      translate([c[0], D - 1, c[1]])
        rotate([-90, 0, 0]) cylinder(d = screw_clear, h = lid_t + 2);
      translate([c[0], D + lid_t - screw_head_h, c[1]])
        rotate([-90, 0, 0]) cylinder(d = screw_head, h = screw_head_h + 1);
      cb = D + lid_t - screw_head_h;
      translate([c[0] - screw_head / 2, cb - layer_h, c[1] - screw_clear / 2])
        cube([screw_head, layer_h + 0.01, screw_clear]);
      translate([c[0] - screw_clear / 2, cb - 2 * layer_h, c[1] - screw_clear / 2])
        cube([screw_clear, 2 * layer_h + 0.01, screw_clear]);
    }
  }
}

// ---------------- preview stand-ins ----------------
module preview_parts() {
  // XIAO upside down on floor VHB: 21 mm PCB + 2 mm USB overhang (=23 mm), 18 mm wide,
  // 5.5 mm to top of PCB (w/ VHB + shield), 21 mm total height w/ DuPonts plugged in
  xx = usb_right ? W - 21.3 : 0.3;
  xy = 0.6;
  xz = 4.3; // top of 1.2 mm PCB sits at 5.5 mm
  color("Gold")      translate([xx + 5, xy + 2.5, 1.1]) cube([11, 13.0, 3.2]);
  color("Silver")    translate([usb_right ? xx + 15.0 : xx - 2.0, xiao_cy - 4.5, xz - 3.2]) cube([8.0, 9.0, 3.2]);
  color("SteelBlue") translate([xx, xy, xz]) cube([21.0, 18.0, 1.2]);
  for (y = [xy, xy + 18.0 - 2.54])
    color("Black") translate([xx + 1.5, y, xz + 1.2]) cube([17.8, 2.54, 15.5]);
  color("Gold")  translate([usb_right ? xx + 2.0 : xx + 19.0, xy + 2.2, xz - 2.3]) cylinder(d = 2.6, h = 2.3);
  color("Black") translate([usb_right ? xx - 10 : xx + 19.0, xy + 1.6, xz - 2.0]) cube([12, 1.2, 1.2]);

  // ATGM336H GPS right-side up on floor VHB (flat RF shield down; DuPonts, battery & U.FL on top)
  gx = usb_right ? 0.5 : W - 13.5;
  gy = 1.2;
  gz = 1.1 + 2.3;
  color("Silver")      translate([gx + 1.5, gy + 2.0, 1.1]) cube([10.0, 10.0, 2.3]);
  color("ForestGreen") translate([gx, gy, gz]) cube([13.0, 16.0, 1.2]);
  color("Gold")        translate([gx + 0.15, gy + 13.4, gz + 1.2]) cube([12.7, 2.54, 2.5]);
  color("Black")       translate([gx + 0.15, gy + 13.4, gz + 3.7]) cube([7.7, 2.54, 13.0]);
  color("Silver")      translate([gx + 7.5, gy + 6.5, gz + 1.2]) cylinder(d = 5.5, h = 2.4);
  color("Goldenrod")   translate([usb_right ? gx + 10.5 : gx + 2.5, gy + 2.8, gz + 1.2]) cylinder(d = 2.6, h = 2.3);
  color("DimGray")     translate([usb_right ? gx + 10.5 : gx - 1.5, gy + 2.2, gz + 2.2]) cube([12, 1.2, 1.2]);

  // OLED seated in C-frame on 1.1 mm side VHB strips (header on -X, off-center ribbon on +X)
  color("RoyalBlue") translate([oled_cx - 19.0, 1.1, oled_cz - 6.0]) cube([38.0, 2.7, 12.0]);
  color("Black")     translate([oled_cx - 18.1, 3.8, oled_cz - 5.1]) cube([2.6, 14.0, 10.2]);
  color("Orange")    translate([oled_cx + 18.8, 1.1, oled_cz - 5.4]) cube([1.7, 2.7, 8.8]);

  // Buzzer & LED
  color("DimGray")   translate([buz_c[0], 0, buz_c[1]]) rotate([-90, 0, 0]) cylinder(d = buz_d, h = 9.5);
  color("White")     translate([led_c[0], 0, led_c[1]]) rotate([-90, 0, 0]) cylinder(d = led_d, h = 3.0);

  // Exposed 20 x 6 x 6.1 mm ceramic GPS antenna; coax exits front-left (+X) notch & curves down
  ant_y0 = gant_y0 + (gant_in_l - 20.0) / 2;
  ant_z0 = H - gant_drop;
  coax_x = W / 2 + 1.6;
  color("ForestGreen") translate([W / 2 - 3.0, ant_y0, ant_z0]) cube([6.0, 20.0, 1.0]);
  color("PeachPuff")   translate([W / 2 - 3.0, ant_y0, ant_z0 + 1.0]) cube([6.0, 20.0, gant_h - 1.0]);
  color("DimGray")     translate([coax_x, ant_y0 - 2.2, ant_z0 + 0.5]) rotate([-90, 0, 0]) cylinder(d = 1.25, h = 2.5);
  color("DimGray")     translate([coax_x, ant_y0 - 2.2, ant_z0 - 5.5]) cylinder(d = 1.25, h = 6.0);

  // SMA & rear-top button
  color("Goldenrod") translate([sma_c[0], sma_c[1], H - 10]) cylinder(d = 6.35, h = 18);
  color("Black")     translate([btn_c[0] - 3.1, btn_c[1] - 3.1, H + wall - btn_seat_d]) cube([6.2, 6.2, 3.5]);
}

// ---------------- output ----------------
if (part == "shell")
  translate([0, 0, front]) rotate([90, 0, 0]) shell();
else if (part == "lid")
  translate([0, 0, D + lid_t]) rotate([-90, 0, 0]) lid();
else if (part == "assembly") {
  color("DarkSlateGray", 0.35) shell();
  color("DarkSlateGray", 0.35) translate([0, 25, 0]) lid();
  preview_parts();
}
